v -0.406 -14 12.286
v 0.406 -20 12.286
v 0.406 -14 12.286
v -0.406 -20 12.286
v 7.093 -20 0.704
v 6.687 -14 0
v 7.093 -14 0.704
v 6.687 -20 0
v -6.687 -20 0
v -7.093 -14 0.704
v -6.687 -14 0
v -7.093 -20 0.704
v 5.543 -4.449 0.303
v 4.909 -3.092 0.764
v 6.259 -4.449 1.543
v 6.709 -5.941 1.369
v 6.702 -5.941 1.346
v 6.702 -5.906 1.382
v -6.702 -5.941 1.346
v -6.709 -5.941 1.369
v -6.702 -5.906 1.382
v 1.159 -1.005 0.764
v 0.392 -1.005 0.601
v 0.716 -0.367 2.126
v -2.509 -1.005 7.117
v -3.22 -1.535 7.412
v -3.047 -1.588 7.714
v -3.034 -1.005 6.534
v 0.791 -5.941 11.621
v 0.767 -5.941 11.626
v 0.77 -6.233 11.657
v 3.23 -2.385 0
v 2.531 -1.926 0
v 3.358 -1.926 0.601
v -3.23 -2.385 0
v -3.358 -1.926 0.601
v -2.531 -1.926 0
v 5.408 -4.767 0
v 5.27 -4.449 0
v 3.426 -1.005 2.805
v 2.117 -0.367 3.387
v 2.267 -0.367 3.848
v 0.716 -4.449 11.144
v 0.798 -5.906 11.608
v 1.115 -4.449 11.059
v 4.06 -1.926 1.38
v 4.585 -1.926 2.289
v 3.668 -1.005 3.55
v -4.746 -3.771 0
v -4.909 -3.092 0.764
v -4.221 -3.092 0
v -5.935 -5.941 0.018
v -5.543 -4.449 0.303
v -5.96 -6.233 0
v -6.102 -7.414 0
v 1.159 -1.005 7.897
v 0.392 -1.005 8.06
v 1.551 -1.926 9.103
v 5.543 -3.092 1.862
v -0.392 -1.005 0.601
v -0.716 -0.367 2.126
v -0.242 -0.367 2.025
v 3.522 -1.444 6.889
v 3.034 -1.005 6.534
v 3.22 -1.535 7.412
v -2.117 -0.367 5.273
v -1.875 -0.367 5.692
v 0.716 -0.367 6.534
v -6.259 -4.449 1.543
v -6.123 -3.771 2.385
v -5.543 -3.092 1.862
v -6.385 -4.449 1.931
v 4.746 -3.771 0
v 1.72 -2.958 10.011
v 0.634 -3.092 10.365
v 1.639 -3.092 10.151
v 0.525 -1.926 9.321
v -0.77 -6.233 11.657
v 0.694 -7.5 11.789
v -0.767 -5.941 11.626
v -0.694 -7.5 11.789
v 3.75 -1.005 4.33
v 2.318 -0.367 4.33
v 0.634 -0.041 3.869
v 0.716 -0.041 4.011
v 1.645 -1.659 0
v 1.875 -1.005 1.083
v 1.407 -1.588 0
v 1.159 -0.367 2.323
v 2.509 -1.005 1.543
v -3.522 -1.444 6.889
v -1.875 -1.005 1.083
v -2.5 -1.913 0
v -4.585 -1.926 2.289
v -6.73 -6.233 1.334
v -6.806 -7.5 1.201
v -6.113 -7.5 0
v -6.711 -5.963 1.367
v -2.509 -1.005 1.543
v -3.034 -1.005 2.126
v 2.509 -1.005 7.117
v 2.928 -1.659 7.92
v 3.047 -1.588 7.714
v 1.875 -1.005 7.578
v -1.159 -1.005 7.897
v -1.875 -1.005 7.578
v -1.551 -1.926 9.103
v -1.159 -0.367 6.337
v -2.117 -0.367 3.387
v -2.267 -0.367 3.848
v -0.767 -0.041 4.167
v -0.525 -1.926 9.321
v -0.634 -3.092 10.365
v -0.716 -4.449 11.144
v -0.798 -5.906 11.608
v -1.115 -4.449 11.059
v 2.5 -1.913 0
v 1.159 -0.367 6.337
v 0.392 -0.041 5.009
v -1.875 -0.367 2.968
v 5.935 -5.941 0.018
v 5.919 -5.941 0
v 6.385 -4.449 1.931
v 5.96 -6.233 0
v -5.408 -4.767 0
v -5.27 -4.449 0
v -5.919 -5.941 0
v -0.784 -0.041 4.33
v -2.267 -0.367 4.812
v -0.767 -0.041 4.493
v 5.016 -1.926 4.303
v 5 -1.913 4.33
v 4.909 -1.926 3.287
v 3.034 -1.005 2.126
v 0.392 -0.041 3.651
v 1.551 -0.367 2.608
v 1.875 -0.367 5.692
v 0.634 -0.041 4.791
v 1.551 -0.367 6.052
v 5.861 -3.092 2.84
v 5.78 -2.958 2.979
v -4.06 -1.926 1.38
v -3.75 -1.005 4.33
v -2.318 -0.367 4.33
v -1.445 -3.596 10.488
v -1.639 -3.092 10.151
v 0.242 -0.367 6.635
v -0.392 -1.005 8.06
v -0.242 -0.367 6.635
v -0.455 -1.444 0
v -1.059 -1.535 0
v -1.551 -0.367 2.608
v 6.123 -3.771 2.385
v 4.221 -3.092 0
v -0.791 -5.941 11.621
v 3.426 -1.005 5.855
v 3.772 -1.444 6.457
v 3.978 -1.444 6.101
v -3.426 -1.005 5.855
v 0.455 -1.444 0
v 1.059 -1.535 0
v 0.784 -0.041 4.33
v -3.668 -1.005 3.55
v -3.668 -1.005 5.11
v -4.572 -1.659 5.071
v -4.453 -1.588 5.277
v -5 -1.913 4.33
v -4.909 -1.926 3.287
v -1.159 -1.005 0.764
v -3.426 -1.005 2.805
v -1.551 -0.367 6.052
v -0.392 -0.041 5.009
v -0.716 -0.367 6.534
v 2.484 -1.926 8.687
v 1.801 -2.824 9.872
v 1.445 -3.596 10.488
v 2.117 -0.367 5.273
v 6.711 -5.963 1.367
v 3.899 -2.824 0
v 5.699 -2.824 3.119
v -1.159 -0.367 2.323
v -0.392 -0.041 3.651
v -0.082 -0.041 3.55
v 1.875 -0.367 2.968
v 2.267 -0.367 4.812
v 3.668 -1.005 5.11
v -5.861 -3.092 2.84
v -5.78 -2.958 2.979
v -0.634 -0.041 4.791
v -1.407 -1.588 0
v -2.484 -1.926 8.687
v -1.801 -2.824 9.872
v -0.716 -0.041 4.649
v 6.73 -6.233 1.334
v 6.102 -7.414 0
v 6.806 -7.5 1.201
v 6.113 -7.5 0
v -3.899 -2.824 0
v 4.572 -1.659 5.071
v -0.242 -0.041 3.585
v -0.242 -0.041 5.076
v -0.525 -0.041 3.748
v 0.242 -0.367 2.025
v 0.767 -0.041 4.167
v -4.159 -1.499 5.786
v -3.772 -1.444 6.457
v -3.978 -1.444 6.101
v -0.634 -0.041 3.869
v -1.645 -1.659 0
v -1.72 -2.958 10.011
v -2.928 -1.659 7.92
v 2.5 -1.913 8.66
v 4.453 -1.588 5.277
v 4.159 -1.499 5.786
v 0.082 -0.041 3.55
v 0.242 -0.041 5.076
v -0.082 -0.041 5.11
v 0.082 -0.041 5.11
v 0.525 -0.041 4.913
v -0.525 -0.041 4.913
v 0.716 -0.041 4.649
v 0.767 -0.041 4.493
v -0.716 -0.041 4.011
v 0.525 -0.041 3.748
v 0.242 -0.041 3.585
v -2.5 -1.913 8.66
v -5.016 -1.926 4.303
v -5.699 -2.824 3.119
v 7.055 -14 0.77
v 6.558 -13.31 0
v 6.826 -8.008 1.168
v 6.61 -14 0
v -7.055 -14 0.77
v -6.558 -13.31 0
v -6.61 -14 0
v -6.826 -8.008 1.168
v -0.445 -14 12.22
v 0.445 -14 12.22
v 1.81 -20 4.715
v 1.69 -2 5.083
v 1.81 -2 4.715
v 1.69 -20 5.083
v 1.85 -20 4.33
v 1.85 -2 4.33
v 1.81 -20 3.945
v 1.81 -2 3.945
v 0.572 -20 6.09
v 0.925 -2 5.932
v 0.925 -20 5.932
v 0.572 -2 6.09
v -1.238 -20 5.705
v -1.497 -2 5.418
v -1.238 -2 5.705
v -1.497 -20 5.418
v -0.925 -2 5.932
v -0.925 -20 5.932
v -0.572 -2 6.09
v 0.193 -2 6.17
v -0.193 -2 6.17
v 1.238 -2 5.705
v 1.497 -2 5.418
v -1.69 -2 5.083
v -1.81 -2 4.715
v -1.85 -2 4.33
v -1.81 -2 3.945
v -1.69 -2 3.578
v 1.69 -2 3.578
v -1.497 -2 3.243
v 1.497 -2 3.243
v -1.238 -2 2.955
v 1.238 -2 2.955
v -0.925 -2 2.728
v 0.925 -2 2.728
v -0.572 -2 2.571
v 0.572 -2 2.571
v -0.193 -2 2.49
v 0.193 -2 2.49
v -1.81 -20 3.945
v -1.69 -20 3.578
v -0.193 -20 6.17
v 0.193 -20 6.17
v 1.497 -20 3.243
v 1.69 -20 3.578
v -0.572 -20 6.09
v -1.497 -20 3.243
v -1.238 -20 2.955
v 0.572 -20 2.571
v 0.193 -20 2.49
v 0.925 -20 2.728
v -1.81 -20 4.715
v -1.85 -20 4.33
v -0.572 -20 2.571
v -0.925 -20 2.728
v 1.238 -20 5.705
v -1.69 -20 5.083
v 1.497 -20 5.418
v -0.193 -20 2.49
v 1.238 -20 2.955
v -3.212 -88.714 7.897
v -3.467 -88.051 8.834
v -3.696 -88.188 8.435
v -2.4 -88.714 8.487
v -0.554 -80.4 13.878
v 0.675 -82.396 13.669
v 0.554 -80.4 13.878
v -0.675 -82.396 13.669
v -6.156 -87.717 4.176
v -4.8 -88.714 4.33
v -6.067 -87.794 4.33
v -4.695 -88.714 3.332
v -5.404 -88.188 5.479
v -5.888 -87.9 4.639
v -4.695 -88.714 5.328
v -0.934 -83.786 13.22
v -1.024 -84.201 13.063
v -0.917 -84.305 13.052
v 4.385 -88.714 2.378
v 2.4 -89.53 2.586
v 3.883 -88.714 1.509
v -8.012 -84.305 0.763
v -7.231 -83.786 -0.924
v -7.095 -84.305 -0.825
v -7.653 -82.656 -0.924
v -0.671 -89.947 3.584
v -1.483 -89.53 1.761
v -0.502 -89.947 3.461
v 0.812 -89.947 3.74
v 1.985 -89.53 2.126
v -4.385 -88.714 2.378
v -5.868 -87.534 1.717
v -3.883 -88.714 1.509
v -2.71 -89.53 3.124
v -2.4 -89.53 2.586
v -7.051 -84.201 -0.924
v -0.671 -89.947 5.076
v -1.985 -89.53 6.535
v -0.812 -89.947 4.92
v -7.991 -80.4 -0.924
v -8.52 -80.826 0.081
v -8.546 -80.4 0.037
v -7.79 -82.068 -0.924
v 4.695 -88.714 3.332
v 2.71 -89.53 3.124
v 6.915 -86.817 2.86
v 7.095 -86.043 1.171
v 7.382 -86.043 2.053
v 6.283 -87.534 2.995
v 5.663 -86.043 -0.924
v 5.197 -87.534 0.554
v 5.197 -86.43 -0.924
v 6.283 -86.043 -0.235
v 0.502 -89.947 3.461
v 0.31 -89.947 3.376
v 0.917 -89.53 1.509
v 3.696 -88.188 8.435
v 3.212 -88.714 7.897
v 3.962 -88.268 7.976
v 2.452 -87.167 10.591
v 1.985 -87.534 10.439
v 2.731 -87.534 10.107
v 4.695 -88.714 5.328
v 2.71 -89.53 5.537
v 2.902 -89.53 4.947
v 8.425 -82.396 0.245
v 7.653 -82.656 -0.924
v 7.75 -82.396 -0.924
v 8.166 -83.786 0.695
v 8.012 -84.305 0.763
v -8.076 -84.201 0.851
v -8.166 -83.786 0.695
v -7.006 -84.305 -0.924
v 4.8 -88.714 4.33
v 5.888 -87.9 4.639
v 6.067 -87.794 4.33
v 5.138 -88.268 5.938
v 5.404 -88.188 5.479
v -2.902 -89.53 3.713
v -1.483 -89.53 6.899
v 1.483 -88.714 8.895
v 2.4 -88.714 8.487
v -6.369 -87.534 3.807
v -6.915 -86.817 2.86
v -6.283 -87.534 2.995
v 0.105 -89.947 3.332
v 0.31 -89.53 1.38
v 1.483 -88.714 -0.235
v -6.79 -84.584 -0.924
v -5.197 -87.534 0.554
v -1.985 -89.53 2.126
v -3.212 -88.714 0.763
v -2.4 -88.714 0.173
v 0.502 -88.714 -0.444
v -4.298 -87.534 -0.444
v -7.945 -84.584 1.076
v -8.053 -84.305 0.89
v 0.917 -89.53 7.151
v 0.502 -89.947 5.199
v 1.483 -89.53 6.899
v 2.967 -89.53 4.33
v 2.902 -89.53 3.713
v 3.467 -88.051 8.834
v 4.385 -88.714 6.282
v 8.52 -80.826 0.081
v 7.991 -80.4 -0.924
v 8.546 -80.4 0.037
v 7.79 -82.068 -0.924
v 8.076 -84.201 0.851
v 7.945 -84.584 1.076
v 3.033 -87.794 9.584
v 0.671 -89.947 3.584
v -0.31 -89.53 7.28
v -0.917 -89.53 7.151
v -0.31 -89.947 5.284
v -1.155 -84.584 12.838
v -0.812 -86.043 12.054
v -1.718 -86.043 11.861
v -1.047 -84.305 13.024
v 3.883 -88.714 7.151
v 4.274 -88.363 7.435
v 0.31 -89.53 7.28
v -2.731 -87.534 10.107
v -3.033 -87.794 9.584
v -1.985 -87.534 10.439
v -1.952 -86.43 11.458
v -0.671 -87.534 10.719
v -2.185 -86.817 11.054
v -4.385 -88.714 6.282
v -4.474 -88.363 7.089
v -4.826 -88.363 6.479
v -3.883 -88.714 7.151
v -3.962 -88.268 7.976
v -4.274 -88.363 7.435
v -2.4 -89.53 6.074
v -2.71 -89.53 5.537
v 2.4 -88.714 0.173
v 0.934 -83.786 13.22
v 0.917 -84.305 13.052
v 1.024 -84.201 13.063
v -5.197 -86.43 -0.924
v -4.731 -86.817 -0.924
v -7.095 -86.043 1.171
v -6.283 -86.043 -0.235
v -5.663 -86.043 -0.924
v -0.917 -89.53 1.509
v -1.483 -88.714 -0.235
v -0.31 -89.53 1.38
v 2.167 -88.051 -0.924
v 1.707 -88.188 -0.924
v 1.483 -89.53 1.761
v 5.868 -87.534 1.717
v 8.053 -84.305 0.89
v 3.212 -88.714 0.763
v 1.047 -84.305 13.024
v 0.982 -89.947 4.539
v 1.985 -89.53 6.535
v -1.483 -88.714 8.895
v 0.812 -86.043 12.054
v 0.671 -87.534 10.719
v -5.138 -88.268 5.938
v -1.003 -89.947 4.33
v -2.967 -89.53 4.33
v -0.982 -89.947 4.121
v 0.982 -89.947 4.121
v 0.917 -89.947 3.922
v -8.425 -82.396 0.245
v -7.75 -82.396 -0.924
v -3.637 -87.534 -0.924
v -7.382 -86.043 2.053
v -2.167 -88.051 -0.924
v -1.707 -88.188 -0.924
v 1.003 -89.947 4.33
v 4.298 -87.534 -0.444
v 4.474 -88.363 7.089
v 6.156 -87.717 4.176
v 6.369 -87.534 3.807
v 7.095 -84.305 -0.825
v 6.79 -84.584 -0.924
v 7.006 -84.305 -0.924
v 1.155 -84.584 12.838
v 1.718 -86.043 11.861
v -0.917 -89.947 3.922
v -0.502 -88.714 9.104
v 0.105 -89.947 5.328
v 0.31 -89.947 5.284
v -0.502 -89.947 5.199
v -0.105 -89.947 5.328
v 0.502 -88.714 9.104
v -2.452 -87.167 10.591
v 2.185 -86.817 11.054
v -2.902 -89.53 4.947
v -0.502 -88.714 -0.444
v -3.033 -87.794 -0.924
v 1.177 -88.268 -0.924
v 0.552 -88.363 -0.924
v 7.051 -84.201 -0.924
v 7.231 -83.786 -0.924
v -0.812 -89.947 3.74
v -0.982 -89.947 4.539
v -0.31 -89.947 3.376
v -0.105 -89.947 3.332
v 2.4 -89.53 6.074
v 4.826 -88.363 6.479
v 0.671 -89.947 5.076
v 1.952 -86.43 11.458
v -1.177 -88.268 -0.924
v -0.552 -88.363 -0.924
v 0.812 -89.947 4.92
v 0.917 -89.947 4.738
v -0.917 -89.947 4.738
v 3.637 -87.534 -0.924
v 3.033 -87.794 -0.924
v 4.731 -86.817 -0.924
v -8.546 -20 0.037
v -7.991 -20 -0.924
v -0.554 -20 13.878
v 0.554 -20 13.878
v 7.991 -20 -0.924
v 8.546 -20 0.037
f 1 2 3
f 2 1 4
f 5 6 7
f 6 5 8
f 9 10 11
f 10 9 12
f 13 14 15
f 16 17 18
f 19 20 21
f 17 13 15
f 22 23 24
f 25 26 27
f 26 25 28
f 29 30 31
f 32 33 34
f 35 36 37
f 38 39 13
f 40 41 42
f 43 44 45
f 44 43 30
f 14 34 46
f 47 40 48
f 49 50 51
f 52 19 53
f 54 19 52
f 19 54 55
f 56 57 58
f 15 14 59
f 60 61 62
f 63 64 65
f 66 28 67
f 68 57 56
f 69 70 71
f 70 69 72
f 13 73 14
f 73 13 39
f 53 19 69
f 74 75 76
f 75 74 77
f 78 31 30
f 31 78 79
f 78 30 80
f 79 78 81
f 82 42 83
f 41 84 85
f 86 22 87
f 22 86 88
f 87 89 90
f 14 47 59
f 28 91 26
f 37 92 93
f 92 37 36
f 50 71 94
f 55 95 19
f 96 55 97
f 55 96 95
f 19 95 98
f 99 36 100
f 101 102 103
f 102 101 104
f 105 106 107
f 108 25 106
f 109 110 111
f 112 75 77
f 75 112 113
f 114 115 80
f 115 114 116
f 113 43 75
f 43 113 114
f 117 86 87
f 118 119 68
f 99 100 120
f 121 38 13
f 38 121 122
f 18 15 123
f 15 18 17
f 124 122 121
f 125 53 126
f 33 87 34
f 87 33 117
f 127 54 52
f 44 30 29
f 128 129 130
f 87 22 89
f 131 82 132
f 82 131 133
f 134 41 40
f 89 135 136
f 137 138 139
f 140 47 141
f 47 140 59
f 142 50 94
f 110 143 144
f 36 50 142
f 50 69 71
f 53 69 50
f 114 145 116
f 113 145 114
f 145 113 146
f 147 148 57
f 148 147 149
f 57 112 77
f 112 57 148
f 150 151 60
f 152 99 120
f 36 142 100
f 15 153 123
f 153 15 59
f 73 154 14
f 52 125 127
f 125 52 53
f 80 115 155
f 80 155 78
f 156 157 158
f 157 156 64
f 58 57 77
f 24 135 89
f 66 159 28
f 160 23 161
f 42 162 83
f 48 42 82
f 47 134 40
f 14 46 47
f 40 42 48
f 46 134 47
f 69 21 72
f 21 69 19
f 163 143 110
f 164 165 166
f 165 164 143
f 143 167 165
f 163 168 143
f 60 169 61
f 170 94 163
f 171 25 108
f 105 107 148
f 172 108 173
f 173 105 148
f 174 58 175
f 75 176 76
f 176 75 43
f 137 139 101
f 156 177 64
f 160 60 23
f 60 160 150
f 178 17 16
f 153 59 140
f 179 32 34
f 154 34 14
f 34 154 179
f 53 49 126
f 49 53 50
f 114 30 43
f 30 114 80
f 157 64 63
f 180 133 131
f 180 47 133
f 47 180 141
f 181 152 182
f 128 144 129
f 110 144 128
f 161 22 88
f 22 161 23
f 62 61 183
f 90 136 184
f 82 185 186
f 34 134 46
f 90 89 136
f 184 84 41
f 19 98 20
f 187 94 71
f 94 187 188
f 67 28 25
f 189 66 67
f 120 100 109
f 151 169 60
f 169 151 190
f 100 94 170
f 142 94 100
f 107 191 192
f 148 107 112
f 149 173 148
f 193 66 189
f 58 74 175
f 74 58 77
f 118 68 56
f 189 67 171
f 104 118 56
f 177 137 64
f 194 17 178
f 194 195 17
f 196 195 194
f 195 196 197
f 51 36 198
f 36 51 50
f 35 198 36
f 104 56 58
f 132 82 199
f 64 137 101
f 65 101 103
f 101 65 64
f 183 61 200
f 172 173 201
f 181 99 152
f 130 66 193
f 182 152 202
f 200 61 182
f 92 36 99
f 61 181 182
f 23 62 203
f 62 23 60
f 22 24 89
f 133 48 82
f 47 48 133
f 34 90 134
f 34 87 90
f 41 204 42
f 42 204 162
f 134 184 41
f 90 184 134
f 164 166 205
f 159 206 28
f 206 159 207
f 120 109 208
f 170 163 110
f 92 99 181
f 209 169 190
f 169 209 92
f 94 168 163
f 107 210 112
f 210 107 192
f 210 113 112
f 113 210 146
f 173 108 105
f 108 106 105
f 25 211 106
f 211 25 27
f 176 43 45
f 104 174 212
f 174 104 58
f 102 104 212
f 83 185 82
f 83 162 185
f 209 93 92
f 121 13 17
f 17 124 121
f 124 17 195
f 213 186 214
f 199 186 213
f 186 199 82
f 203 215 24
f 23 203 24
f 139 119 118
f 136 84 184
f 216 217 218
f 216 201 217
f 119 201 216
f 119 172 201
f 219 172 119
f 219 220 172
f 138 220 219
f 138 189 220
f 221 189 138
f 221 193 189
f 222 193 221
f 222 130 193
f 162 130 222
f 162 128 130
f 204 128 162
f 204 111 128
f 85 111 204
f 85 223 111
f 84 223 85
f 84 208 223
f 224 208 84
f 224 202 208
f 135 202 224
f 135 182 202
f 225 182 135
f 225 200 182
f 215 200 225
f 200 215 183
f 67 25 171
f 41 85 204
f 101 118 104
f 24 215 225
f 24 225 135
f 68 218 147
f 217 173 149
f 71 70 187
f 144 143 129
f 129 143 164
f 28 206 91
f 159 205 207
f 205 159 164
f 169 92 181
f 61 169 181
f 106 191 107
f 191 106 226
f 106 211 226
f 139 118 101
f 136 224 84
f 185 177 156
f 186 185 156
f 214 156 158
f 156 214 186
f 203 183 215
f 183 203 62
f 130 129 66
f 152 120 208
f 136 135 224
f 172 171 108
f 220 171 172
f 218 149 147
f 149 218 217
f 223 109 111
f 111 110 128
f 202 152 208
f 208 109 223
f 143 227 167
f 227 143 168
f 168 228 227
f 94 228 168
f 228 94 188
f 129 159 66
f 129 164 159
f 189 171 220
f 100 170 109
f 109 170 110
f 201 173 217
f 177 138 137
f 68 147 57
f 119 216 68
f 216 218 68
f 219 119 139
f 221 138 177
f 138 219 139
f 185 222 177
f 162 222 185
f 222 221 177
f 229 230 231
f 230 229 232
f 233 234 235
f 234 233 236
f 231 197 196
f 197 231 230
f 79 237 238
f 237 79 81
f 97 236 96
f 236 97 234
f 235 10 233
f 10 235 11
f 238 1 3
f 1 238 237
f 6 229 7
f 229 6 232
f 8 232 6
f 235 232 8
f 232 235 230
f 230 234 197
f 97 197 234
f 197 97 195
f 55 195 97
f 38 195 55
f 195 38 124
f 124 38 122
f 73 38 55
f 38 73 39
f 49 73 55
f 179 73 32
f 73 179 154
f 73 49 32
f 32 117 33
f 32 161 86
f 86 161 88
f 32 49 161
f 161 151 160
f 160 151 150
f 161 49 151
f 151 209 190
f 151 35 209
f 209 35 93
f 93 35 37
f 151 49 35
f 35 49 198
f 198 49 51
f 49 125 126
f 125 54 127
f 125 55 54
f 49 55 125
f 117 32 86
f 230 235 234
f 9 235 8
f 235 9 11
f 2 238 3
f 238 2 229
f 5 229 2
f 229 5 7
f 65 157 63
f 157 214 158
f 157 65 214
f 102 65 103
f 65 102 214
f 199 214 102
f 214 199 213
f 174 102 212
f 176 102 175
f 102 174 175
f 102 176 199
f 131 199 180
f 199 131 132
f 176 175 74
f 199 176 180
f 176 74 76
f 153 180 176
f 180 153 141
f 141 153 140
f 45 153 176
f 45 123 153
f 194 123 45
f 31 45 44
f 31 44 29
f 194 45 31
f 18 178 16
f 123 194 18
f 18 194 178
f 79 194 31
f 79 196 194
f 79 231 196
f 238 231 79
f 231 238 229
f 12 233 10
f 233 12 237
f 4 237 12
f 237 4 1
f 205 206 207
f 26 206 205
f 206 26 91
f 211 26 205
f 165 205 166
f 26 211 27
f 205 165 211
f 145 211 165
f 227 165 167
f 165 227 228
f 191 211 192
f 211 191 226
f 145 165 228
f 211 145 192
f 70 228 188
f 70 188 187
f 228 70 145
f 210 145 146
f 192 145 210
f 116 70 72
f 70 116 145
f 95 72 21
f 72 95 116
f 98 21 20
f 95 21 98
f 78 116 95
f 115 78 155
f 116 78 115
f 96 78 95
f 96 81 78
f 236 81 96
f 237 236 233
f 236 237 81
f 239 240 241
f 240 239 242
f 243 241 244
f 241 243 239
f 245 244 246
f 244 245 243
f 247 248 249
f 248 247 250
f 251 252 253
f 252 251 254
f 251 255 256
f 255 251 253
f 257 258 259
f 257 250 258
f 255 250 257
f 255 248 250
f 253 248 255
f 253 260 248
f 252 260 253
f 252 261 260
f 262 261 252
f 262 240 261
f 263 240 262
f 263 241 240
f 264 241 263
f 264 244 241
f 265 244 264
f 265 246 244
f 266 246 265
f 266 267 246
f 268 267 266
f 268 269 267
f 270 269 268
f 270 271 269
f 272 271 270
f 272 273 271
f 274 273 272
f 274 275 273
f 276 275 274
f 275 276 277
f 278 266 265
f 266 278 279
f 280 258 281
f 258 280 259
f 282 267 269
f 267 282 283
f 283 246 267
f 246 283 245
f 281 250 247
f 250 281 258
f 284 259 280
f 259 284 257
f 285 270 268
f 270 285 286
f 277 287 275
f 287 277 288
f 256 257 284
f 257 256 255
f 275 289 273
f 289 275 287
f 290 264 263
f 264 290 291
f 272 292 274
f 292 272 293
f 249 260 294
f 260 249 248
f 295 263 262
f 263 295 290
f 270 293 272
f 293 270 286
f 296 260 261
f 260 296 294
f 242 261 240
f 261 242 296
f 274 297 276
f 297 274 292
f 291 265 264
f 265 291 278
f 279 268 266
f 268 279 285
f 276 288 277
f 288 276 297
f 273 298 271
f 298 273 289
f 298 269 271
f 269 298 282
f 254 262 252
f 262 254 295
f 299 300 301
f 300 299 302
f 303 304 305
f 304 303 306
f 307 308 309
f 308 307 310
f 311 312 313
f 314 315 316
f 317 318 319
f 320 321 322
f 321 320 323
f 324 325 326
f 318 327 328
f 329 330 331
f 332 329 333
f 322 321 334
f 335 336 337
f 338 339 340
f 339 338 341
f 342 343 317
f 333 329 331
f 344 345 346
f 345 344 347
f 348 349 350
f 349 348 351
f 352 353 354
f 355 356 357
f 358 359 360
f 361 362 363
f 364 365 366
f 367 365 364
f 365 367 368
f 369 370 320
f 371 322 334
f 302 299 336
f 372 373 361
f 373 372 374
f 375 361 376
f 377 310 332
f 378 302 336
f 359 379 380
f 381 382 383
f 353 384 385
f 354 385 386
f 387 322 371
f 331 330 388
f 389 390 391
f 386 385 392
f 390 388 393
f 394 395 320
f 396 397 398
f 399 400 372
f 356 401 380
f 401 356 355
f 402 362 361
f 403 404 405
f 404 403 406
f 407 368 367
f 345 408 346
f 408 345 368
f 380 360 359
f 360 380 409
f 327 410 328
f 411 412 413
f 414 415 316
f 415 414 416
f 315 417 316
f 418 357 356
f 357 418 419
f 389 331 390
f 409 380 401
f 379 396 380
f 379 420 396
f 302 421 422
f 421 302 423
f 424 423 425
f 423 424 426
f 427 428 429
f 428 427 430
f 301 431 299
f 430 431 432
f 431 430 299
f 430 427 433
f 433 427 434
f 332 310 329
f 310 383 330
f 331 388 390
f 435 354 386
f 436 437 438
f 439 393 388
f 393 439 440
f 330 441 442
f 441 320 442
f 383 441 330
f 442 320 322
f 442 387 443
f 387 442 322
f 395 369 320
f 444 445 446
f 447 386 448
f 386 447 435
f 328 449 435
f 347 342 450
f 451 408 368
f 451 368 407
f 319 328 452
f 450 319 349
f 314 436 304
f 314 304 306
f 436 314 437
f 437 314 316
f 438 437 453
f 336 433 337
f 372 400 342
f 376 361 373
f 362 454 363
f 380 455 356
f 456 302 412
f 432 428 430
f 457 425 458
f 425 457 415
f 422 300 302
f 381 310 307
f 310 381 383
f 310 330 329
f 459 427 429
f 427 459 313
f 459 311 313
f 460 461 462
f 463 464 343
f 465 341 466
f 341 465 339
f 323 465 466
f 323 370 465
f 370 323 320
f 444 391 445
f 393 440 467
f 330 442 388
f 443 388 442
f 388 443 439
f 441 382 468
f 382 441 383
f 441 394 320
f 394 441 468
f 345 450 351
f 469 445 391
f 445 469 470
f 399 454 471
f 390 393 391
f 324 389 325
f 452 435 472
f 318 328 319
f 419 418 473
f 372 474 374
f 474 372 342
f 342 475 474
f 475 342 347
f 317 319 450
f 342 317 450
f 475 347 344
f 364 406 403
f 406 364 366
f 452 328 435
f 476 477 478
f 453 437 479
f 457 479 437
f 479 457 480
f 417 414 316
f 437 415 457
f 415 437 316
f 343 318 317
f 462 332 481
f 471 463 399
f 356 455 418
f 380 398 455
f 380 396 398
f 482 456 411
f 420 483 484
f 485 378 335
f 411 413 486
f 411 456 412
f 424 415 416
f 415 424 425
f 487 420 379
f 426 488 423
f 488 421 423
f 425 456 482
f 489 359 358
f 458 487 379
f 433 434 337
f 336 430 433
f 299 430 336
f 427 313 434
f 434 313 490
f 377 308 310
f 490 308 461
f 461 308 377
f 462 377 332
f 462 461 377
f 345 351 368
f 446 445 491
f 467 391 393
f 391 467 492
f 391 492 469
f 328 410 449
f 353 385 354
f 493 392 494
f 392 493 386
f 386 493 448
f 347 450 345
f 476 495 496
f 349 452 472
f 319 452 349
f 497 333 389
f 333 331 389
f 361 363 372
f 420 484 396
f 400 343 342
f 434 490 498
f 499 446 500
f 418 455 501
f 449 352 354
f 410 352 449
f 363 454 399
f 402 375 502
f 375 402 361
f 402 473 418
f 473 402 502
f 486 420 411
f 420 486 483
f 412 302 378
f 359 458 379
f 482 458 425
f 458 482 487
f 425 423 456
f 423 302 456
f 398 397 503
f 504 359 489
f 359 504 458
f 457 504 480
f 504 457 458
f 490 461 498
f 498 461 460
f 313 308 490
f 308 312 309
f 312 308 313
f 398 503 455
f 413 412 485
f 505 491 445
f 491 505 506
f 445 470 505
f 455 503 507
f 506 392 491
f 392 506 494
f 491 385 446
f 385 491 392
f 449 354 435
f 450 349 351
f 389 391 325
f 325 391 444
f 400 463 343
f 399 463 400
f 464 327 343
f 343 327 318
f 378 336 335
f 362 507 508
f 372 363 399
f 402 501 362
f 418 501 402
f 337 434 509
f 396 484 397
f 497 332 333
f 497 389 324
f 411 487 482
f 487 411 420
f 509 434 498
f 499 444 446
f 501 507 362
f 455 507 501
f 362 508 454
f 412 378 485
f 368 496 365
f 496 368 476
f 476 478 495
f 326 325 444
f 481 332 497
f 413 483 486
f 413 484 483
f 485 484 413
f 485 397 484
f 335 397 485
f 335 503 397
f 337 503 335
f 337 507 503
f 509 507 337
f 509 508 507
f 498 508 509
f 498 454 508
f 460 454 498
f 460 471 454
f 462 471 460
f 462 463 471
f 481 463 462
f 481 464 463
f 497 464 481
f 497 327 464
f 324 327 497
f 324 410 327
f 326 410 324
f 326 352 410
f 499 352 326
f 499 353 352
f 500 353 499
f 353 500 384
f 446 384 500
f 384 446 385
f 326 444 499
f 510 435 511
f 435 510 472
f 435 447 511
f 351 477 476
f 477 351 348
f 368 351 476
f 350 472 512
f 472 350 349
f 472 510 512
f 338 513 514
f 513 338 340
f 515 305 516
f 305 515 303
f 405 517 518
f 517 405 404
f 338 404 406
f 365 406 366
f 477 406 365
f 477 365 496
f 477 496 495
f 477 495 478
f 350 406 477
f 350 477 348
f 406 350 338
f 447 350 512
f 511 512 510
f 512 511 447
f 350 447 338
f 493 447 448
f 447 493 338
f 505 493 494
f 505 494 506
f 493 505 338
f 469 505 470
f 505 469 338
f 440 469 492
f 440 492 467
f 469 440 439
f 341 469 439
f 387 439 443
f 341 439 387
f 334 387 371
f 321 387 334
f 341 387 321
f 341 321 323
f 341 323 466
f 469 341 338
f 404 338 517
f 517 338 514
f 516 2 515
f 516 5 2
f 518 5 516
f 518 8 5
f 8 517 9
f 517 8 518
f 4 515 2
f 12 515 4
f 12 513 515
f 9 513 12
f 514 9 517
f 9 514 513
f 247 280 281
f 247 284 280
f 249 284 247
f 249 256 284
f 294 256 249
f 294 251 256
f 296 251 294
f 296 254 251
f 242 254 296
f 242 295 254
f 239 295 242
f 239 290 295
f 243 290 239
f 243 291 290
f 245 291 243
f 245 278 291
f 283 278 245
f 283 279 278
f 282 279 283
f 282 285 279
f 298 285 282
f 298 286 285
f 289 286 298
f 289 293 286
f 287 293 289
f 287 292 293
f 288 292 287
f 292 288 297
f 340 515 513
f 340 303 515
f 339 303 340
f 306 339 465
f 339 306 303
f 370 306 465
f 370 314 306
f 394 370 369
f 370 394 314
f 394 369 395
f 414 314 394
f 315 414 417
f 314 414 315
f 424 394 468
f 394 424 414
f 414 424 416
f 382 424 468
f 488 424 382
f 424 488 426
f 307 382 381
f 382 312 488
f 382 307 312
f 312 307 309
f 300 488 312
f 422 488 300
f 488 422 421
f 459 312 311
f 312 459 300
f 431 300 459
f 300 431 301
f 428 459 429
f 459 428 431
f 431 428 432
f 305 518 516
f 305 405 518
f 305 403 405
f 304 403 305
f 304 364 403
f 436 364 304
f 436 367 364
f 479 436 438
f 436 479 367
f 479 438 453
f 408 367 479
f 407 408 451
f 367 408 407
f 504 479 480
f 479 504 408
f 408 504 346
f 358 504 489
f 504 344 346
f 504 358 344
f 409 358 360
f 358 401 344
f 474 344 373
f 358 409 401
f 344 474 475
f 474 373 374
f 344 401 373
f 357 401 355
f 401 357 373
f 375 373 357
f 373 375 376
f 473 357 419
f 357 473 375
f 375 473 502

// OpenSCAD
// Text for the first face of the triangular pen body
Face_1_Text = "";
// Text for the second face of the triangular pen body
Face_2_Text = "";
// Text for the third face of the triangular pen body
Face_3_Text = "";
// Number of pens
Pen_Count = 1;
// Pen body height in millimeters (increase this if you are using long text)
Pen_Height = 80; //70
// Printing vertically is slower but good for high volume of pens with less warping.  Printing horizontally is faster and lets you change the filament colors mid print for high contrast on the face 1 text.
Orientation = "Horizontal"; // [Vertical:Vertical,Horizontal:Horizontal]
// Text depth in millimeters
Text_Depth = .5;
// Text font size
Text_Font_Size = 8;
// Text font name from https://www.google.com/fonts 
Text_Font = "Century Gothic:style=Regular";
// Tolerance for Ink Stick Diameter and Ink Tip Diameter (increase this if the ink stick does not fit into the pen)
Tolerance = .7;
// Ink Tip Diameter (black plastic part behind the cone of the bic pen ink stick)
Ink_Tip_Diameter = 4 + Tolerance;
// Ink Tip Length (black plastic part behind the cone of the bic pen ink stick)
Ink_Tip_Length = 10;
// Ink Stick Diameter (transparent plastic tube part of the bic pen ink stick)
Ink_Stick_Diameter = 3 + Tolerance;
BackWallThickness = 2;
CapOverlap = 10;
CapThickness = 3.2;
/* [Hidden] */
FaceWidth = 15; //11
P1x = 0;
P1y = 0;
P2x = FaceWidth;
P2y = 0;
P3x = (P2x - P1x)/2;
P3y = ((P2x - P1x) * sqrt(3)) / 2;
FaceDepth = P3y;
Cx = (P1x + P2x + P3x) / 3;
Cy = (P1y + P2y + P3y) / 3;

capP1x = 0;
capP1y = 0;
capP2x = FaceWidth+CapThickness;
capP2y = 0;
capP3x = (capP2x - capP1x)/2;
capP3y = ((capP2x - capP1x) * sqrt(3)) / 2;
capCx = (capP1x + capP2x + capP3x) / 3;
capCy = (capP1y + capP2y + capP3y) / 3;


CircumferentialLength = .01;

for(x =[0:Pen_Count-1])
{

	if(Orientation == "Vertical") {
		//offset to keep all the odd numbered pens in line
		offset = x%2==0 ? 0 : 3.5;
		//space out the pens
		translate([x*(FaceWidth/2) + x,offset,0])
		//rotate so each face can be seen when previewing 5 or more
		rotate ([0,0,x*60]) 
		//make a pen
		PenBarrel();
	} else {
		//space out the pens
		translate([x*(FaceWidth) + x,0,Cy])
		//rotate so face 1 will be down for filament color change
		rotate ([90,0,0]) {
            
		//make a pen
		PenBarrel();
            
        //translate([0,0,-(Pen_Height-2*CapOverlap)])
        //PenCap();
            
        translate([0,0,(Pen_Height+CapOverlap)])    
        rotate([0,180,0])    
        PenCap();
        }
        
        
	}
}

module PenBarrel() 
{
	//Make the triangular pen barrel then cut out the face text and the ink stick 
	difference(){		
		//Taper the triangular barrel with a cone at the tip
		intersection(){
            
			// Tip Cone
			translate([0,0, Pen_Height])
			rotate ([0,180,0])
			union(){
				cylinder(h = 25, d1 = Ink_Tip_Diameter+3, d2 = FaceWidth+1, $fs = CircumferentialLength );
				translate([0,0, 25])
				cylinder(h = Pen_Height, d = FaceWidth+1, $fs = CircumferentialLength);
			}
            
			//Triangular pen barrel
			linear_extrude(height = Pen_Height){	
				//Triangle
				translate([-Cx,-Cy,0])
				polygon(points=[[P1x,P1y],[P2x,P2y],[P3x,P3y]]);
			}
          
 			// Butt Cone
            
			union(){
				//cylinder(h = 10, d1 = 10, d2 = 12, $fs = CircumferentialLength );			
                translate([0,0, FaceWidth/2])
                sphere(r = FaceWidth/2, $fs = CircumferentialLength);
                
                translate([0,0, FaceWidth/2])
                cylinder(h = FaceWidth/2, d1 = FaceWidth, d2 = FaceWidth+1,$fs = CircumferentialLength);
                
                translate([0,0, FaceWidth-1])
				cylinder(h = Pen_Height, d1 = FaceWidth+1, d2 = FaceWidth+1,$fs = CircumferentialLength);
			}
            
		}
		union(){		
			FaceTextExtrude(Face_1_Text);
			rotate ([0,0,-120]) {
				FaceTextExtrude(Face_2_Text);
			}
			rotate ([0,0,120]) {			
				FaceTextExtrude(Face_3_Text);
			}		
		}		
		InkStick();
	}
}

module InkStick() 
{
	//Ink stick
	translate([0,0,BackWallThickness])
	cylinder(h = Pen_Height + .02, d = Ink_Stick_Diameter, $fs = CircumferentialLength);
	//Ink tip
	translate([0,0,Pen_Height - Ink_Tip_Length + .001])
	cylinder(h = Ink_Tip_Length + .02, d = Ink_Tip_Diameter, $fs = CircumferentialLength);
}

module FaceTextExtrude(FaceText) 
{
	translate([0,Text_Depth-Cy - .01,Pen_Height/2 - 2])
	rotate ([90,90,0]) 
	linear_extrude(height=Text_Depth + .01, convexity=4)
	text(str(FaceText),size=Text_Font_Size,font=Text_Font,valign="center", halign="center", spacing= 0.9);
}

module PenCap() 
{
		intersection(){
            

			//Triangular pen barrel
			linear_extrude(height = Pen_Height-CapOverlap){	
				//Triangle
				translate([-capCx,-capCy,0])
				polygon(points=[[capP1x,capP1y],[capP2x,capP2y],[capP3x,capP3y]]);
			}
          
 			// Butt Cone
            
			union(){
		
                translate([0,0, (capP2x+1)/2])
                sphere(r = (capP2x+1)/2, $fs = CircumferentialLength);
                
                
                translate([0,0, (capP2x+1)/2])
				cylinder(h = Pen_Height-CapOverlap, d = capP2x+1,$fs = CircumferentialLength);
			}
            
		}

	
}
